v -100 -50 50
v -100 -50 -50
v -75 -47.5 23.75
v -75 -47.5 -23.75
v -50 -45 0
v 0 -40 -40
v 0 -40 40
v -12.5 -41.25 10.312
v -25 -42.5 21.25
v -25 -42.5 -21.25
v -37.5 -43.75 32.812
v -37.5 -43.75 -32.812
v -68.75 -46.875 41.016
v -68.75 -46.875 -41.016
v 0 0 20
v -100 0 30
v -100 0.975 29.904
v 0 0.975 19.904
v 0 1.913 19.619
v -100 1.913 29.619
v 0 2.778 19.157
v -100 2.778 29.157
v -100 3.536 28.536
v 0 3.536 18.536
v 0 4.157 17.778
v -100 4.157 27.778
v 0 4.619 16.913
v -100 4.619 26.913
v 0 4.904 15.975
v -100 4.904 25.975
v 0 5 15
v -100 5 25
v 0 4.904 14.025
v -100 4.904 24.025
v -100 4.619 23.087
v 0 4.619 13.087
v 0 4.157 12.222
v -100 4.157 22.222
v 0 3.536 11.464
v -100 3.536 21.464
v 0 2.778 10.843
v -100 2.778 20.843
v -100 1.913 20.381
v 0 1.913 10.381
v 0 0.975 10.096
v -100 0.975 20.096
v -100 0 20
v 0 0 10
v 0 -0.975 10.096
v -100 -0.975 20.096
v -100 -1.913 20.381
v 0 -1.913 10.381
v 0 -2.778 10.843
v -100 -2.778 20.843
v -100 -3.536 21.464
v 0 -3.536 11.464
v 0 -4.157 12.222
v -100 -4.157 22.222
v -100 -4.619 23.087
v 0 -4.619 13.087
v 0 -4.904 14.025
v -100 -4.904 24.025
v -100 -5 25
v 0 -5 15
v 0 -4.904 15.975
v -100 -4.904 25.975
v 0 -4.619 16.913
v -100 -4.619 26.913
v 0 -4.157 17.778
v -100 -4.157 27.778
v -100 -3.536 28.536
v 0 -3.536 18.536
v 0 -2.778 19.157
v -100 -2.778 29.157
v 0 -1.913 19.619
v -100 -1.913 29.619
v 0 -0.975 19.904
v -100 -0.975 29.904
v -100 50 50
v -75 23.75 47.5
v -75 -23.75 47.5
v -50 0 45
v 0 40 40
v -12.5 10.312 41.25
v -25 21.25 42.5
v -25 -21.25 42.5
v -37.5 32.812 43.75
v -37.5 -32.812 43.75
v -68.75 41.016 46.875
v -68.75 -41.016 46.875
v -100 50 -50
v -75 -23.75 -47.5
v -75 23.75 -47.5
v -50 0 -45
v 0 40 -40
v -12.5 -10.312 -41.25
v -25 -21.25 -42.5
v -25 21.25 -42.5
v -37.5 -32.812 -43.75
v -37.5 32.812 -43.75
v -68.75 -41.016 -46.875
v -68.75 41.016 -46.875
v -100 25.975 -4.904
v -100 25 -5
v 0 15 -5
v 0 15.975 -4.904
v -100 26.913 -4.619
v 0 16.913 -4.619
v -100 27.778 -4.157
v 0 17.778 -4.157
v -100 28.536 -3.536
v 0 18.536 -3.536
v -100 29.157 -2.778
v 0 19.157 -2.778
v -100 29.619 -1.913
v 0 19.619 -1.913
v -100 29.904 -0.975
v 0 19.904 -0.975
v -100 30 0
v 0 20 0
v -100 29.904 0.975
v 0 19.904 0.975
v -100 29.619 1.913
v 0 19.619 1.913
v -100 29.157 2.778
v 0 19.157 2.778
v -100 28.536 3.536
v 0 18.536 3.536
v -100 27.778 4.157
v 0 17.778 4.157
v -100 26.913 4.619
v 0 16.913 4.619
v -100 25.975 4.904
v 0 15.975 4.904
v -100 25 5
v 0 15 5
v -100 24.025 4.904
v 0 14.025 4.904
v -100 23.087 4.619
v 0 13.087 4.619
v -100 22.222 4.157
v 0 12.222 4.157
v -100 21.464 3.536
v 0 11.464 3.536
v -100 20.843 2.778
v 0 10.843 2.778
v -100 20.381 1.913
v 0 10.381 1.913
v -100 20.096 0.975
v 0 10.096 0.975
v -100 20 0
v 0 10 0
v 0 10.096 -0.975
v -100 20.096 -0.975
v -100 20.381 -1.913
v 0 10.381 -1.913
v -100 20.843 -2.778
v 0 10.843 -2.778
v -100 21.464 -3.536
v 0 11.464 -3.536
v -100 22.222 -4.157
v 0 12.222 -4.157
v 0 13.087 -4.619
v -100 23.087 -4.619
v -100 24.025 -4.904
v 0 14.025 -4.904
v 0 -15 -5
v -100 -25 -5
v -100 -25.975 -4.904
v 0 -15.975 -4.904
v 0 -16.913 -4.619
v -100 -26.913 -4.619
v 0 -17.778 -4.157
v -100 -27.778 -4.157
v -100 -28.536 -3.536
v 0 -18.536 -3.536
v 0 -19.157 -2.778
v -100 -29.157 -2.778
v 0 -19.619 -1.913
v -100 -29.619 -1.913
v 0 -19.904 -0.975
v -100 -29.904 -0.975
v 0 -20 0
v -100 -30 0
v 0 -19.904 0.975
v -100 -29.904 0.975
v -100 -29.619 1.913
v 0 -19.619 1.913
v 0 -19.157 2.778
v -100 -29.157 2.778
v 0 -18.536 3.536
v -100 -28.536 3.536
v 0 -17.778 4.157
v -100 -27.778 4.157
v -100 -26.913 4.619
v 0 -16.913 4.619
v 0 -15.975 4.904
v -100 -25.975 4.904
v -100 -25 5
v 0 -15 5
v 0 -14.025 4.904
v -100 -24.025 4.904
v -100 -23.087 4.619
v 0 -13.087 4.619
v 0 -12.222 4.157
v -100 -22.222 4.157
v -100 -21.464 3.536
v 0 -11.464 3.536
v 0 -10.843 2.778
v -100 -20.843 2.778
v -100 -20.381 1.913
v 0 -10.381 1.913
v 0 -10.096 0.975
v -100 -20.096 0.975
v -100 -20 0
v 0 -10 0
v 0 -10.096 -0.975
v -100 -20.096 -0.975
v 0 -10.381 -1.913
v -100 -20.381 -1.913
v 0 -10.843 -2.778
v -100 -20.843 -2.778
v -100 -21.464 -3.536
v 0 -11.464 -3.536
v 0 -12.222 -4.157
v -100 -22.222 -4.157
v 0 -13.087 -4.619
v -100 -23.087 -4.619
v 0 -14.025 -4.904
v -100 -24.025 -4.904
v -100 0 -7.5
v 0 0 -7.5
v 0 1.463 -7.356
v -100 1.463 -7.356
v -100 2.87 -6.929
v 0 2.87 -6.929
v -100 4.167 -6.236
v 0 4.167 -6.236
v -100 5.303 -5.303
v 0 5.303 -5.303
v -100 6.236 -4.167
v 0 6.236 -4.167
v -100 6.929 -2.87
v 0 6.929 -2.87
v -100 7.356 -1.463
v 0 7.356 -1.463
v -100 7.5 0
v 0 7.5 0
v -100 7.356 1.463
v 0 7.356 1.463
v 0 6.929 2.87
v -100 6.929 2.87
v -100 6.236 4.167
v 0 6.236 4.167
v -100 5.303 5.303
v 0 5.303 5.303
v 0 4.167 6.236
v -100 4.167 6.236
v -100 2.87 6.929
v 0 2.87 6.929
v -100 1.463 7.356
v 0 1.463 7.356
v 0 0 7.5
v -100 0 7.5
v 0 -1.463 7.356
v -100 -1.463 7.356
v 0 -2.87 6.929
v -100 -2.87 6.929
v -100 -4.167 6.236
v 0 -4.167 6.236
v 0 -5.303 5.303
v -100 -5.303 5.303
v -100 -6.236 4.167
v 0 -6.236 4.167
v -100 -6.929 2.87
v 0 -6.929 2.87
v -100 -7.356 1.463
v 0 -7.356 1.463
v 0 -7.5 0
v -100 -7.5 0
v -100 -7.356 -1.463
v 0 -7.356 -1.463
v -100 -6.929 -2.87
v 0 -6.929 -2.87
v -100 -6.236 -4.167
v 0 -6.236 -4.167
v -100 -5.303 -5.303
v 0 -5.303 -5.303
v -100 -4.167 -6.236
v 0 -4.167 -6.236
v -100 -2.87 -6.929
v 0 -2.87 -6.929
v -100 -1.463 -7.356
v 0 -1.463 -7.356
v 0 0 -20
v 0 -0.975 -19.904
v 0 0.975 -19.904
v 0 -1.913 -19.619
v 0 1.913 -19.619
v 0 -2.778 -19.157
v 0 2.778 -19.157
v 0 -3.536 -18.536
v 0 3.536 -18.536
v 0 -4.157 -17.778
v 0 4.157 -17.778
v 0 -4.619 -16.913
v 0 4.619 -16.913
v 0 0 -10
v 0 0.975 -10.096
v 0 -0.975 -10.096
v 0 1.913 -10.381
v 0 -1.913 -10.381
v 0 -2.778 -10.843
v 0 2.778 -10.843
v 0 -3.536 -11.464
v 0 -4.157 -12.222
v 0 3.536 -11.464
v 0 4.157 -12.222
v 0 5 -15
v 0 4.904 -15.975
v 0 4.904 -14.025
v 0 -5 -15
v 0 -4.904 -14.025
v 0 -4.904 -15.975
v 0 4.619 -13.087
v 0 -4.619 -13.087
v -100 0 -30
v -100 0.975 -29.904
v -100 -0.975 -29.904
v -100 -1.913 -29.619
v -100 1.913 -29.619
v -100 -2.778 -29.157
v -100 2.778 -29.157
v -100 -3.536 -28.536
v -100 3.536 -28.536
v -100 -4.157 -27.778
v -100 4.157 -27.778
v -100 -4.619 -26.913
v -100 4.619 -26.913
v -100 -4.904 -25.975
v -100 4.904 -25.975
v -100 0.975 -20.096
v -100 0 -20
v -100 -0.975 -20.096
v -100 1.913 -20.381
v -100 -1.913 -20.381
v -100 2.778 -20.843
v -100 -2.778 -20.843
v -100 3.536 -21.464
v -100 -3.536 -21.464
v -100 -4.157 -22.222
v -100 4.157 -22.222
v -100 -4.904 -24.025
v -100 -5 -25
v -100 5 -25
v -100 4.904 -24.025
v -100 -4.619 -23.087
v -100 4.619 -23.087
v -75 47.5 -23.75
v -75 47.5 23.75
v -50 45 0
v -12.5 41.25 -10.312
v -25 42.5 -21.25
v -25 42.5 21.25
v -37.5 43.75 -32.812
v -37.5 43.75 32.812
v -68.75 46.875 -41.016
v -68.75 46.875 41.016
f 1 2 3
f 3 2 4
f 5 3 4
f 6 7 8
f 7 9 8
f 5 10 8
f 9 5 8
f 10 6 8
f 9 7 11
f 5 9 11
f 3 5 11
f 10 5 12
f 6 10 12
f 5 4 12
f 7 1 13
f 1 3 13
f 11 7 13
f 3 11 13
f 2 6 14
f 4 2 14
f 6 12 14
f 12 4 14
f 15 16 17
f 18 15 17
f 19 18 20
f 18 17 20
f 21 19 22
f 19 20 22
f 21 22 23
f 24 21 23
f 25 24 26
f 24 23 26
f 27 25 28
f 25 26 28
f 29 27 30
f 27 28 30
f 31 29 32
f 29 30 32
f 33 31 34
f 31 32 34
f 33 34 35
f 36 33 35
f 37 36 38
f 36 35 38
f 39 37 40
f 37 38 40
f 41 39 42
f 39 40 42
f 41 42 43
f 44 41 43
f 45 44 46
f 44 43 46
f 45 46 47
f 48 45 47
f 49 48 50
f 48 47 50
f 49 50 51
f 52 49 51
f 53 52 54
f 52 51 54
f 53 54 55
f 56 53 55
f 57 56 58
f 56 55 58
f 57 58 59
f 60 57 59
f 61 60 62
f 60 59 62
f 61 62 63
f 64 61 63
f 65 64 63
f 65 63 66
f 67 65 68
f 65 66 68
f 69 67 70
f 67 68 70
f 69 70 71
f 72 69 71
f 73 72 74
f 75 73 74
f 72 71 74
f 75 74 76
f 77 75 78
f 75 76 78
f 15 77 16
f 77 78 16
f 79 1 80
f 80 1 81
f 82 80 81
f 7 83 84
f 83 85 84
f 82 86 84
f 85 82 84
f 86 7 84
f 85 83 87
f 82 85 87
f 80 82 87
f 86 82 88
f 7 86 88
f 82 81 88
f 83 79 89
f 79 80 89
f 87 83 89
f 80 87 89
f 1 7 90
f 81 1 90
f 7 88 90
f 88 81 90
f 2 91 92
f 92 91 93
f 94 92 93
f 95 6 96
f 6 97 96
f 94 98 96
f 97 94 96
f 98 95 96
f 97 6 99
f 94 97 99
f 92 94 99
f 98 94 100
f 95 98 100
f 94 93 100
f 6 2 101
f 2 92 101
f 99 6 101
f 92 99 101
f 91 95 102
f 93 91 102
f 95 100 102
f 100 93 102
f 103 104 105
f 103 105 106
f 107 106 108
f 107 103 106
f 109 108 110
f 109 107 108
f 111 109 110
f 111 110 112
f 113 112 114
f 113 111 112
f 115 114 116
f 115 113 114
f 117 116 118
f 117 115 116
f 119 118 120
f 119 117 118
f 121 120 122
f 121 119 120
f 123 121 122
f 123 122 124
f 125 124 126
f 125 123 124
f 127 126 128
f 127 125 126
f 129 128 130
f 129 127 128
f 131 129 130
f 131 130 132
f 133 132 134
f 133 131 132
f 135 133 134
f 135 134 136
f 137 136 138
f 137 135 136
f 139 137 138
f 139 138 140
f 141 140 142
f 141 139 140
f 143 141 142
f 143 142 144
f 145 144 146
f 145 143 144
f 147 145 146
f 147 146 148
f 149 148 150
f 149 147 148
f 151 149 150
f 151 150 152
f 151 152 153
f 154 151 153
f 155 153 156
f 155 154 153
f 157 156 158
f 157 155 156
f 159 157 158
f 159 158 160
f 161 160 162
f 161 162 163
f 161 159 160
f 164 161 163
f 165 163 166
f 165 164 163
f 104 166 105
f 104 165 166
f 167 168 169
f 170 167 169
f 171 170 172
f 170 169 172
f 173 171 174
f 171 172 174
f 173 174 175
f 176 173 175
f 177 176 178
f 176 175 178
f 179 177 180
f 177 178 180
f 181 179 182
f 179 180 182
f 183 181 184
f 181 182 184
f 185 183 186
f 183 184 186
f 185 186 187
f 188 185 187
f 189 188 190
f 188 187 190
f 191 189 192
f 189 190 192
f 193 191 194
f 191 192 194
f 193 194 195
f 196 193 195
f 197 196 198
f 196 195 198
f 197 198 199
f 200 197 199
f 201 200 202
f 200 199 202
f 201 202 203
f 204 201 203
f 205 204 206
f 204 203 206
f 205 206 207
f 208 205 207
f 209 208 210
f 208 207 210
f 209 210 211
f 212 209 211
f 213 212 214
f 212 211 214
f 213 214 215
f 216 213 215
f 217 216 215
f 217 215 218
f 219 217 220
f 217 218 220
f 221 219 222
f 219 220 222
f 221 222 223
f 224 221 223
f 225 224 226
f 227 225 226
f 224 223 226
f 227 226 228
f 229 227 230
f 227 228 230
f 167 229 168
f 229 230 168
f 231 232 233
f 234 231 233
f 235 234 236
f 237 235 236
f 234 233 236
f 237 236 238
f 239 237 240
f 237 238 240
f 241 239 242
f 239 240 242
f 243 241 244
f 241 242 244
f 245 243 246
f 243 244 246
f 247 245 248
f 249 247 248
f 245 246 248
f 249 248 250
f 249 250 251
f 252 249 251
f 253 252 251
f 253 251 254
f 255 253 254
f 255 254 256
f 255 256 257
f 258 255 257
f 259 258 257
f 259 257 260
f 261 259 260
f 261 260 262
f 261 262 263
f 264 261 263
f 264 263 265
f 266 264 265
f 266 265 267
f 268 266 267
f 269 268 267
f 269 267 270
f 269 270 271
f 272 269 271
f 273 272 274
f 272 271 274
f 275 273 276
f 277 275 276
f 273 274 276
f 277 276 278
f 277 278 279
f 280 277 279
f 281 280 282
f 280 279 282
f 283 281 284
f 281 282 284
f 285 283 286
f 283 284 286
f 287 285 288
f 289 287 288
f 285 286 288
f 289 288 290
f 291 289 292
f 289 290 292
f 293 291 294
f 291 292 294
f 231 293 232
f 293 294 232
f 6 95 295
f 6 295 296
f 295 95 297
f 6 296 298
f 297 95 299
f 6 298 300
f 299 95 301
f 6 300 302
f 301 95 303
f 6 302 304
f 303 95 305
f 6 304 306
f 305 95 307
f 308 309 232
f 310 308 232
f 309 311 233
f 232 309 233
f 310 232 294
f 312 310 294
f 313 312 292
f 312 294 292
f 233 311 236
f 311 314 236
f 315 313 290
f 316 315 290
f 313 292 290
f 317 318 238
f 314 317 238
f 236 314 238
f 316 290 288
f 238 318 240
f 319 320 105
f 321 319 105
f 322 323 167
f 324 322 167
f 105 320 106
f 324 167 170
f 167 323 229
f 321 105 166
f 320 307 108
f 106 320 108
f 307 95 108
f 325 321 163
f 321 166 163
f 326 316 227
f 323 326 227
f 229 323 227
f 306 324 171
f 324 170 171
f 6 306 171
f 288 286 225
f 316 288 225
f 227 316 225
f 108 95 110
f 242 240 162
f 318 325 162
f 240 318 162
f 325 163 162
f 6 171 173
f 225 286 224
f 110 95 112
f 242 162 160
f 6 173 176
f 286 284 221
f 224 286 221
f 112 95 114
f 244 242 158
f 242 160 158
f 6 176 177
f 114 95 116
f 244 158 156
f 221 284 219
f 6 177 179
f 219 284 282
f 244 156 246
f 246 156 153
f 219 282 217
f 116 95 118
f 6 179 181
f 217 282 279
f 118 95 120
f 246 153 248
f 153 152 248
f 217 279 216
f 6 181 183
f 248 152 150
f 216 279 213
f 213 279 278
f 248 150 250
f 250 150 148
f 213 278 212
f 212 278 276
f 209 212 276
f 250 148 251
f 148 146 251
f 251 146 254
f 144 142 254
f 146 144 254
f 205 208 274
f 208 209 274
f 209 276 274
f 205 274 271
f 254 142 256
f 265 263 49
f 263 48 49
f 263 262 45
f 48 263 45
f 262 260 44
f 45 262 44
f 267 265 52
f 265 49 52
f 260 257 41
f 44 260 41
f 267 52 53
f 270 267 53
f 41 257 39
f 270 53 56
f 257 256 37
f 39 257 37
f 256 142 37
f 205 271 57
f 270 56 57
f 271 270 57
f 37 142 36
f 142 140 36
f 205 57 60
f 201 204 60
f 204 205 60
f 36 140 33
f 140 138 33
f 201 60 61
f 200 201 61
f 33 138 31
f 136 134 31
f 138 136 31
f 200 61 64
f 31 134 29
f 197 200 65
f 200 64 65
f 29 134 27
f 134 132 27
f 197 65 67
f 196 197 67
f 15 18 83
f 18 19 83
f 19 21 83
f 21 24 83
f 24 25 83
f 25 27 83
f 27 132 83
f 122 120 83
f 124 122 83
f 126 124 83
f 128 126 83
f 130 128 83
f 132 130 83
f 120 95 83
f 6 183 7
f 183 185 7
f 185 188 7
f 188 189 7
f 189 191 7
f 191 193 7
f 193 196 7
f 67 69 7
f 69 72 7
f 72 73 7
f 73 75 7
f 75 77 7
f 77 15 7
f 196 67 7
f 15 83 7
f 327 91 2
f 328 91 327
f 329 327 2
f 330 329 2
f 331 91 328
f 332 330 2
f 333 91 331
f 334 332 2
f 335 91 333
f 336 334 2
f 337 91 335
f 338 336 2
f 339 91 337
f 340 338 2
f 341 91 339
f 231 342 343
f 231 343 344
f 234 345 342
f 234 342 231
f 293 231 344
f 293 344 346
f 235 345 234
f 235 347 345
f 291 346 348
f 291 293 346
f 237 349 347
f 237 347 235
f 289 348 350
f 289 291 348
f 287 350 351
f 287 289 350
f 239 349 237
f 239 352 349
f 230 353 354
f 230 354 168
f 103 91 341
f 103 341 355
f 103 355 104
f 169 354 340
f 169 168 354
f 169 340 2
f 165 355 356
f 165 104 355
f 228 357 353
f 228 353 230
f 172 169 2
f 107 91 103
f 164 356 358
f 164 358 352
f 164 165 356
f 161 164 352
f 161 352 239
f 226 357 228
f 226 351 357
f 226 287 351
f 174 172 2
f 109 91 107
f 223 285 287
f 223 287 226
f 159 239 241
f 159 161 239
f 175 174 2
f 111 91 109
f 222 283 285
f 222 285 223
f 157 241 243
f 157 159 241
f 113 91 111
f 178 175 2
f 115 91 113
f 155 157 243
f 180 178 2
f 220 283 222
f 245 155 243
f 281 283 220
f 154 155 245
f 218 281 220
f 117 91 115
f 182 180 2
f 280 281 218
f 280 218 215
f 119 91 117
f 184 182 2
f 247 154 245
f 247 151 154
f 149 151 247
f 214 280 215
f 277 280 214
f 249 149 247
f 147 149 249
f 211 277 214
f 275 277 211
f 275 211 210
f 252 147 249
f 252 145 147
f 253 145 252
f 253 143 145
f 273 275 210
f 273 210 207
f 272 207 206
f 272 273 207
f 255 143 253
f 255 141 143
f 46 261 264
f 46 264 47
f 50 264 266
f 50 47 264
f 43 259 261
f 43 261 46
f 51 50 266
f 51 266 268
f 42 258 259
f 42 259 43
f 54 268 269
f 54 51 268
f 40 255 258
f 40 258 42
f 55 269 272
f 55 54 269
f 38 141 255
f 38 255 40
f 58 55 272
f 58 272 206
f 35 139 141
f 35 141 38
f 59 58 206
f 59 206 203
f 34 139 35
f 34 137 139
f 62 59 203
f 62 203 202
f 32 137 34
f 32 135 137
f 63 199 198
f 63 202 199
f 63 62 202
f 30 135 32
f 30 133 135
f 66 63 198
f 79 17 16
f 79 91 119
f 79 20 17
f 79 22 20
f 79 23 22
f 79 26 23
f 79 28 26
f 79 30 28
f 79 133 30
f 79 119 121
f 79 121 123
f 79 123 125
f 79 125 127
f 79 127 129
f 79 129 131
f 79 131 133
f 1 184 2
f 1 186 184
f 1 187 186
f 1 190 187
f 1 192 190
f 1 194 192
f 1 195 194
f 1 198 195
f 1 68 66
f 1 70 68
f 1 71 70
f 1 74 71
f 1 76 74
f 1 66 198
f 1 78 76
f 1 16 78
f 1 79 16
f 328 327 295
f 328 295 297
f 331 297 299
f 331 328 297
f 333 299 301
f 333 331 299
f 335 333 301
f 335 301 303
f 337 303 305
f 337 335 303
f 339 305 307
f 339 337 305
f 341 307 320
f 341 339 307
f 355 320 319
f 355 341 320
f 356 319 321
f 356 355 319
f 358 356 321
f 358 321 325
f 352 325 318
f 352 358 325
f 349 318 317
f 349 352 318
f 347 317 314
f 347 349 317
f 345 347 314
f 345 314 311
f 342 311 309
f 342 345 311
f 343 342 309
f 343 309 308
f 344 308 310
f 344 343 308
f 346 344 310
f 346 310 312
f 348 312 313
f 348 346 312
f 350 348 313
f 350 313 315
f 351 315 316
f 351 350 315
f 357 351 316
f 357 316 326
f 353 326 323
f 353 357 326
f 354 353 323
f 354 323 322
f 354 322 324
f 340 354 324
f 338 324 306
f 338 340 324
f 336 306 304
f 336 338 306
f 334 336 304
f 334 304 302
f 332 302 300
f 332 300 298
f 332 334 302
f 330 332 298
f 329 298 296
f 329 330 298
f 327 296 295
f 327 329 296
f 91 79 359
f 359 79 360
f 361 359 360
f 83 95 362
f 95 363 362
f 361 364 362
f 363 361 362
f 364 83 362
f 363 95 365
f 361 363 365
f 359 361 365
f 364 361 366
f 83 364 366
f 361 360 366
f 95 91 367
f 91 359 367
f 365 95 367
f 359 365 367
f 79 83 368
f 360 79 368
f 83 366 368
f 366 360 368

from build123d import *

# Parameters (mm, degrees)
SKETCH3_R          = 5
SKETCH6_R          = 5
SKETCH7_R          = 7.5
CUT_EXTRUDE1_DEPTH = 123.474487302


with BuildPart() as part:
    # Sketch1 → Loft1 section 0
    with BuildSketch(Plane(origin=(0, 0, 0), x_dir=(0, 0, -1), z_dir=(1, 0, 0))):
        with BuildLine():
            Line((40, 40), (-40, 40))
            Line((-40, 40), (-40, -40))
            Line((-40, -40), (40, -40))
            Line((40, -40), (40, 40))
        make_face()
    # Sketch2 → Loft1 section 1
    with BuildSketch(Plane(origin=(-100, 0, 0), x_dir=(0, 0, -1), z_dir=(1, 0, 0))):
        with BuildLine():
            Line((50, 50), (-50, 50))
            Line((-50, 50), (-50, -50))
            Line((-50, -50), (50, -50))
            Line((50, -50), (50, 50))
        make_face()
    loft()

    # Cut-Sweep2: sweep along a path in Sketch4
    with BuildLine(Plane(origin=(0, 0, 0), x_dir=(1, 0, 0), z_dir=(0, 1, 0))) as cut_sweep2_path:
        Line((0, 15), (-100, 25))
    # Sketch3 → Cut-Sweep2 (sweep, cut)
    with BuildSketch(Plane(origin=(0, 0, 0), x_dir=(0, 0, -1), z_dir=(1, 0, 0))):
        with Locations((15, 0)):
            Circle(SKETCH3_R)
    cut_sweep2 = sweep(path=cut_sweep2_path.line, mode=Mode.SUBTRACT)

    # Cut-Sweep3: sweep along a path in Sketch5
    with BuildLine(Plane.XY) as cut_sweep3_path:
        Line((0, 15), (-100, 25))
    # Sketch6 → Cut-Sweep3 (sweep, cut)
    with BuildSketch(Plane(origin=(0, 0, 0), x_dir=(0, 0, -1), z_dir=(1, 0, 0))):
        with Locations((0, 15)):
            Circle(SKETCH6_R)
    cut_sweep3 = sweep(path=cut_sweep3_path.line, mode=Mode.SUBTRACT)

    # Mirror1: Cut-Sweep2 across plane
    add(cut_sweep2.mirror(Plane.XY), mode=Mode.SUBTRACT)

    # Mirror2: Cut-Sweep3 across plane
    add(cut_sweep3.mirror(Plane.ZX), mode=Mode.SUBTRACT)

    # Sketch7 → Cut-Extrude1 (cut, through all)
    with BuildSketch(Plane(origin=(0, 0, 0), x_dir=(0, 0, -1), z_dir=(1, 0, 0))):
        Circle(SKETCH7_R)
    extrude(amount=-CUT_EXTRUDE1_DEPTH, mode=Mode.SUBTRACT)


solid = part.part
